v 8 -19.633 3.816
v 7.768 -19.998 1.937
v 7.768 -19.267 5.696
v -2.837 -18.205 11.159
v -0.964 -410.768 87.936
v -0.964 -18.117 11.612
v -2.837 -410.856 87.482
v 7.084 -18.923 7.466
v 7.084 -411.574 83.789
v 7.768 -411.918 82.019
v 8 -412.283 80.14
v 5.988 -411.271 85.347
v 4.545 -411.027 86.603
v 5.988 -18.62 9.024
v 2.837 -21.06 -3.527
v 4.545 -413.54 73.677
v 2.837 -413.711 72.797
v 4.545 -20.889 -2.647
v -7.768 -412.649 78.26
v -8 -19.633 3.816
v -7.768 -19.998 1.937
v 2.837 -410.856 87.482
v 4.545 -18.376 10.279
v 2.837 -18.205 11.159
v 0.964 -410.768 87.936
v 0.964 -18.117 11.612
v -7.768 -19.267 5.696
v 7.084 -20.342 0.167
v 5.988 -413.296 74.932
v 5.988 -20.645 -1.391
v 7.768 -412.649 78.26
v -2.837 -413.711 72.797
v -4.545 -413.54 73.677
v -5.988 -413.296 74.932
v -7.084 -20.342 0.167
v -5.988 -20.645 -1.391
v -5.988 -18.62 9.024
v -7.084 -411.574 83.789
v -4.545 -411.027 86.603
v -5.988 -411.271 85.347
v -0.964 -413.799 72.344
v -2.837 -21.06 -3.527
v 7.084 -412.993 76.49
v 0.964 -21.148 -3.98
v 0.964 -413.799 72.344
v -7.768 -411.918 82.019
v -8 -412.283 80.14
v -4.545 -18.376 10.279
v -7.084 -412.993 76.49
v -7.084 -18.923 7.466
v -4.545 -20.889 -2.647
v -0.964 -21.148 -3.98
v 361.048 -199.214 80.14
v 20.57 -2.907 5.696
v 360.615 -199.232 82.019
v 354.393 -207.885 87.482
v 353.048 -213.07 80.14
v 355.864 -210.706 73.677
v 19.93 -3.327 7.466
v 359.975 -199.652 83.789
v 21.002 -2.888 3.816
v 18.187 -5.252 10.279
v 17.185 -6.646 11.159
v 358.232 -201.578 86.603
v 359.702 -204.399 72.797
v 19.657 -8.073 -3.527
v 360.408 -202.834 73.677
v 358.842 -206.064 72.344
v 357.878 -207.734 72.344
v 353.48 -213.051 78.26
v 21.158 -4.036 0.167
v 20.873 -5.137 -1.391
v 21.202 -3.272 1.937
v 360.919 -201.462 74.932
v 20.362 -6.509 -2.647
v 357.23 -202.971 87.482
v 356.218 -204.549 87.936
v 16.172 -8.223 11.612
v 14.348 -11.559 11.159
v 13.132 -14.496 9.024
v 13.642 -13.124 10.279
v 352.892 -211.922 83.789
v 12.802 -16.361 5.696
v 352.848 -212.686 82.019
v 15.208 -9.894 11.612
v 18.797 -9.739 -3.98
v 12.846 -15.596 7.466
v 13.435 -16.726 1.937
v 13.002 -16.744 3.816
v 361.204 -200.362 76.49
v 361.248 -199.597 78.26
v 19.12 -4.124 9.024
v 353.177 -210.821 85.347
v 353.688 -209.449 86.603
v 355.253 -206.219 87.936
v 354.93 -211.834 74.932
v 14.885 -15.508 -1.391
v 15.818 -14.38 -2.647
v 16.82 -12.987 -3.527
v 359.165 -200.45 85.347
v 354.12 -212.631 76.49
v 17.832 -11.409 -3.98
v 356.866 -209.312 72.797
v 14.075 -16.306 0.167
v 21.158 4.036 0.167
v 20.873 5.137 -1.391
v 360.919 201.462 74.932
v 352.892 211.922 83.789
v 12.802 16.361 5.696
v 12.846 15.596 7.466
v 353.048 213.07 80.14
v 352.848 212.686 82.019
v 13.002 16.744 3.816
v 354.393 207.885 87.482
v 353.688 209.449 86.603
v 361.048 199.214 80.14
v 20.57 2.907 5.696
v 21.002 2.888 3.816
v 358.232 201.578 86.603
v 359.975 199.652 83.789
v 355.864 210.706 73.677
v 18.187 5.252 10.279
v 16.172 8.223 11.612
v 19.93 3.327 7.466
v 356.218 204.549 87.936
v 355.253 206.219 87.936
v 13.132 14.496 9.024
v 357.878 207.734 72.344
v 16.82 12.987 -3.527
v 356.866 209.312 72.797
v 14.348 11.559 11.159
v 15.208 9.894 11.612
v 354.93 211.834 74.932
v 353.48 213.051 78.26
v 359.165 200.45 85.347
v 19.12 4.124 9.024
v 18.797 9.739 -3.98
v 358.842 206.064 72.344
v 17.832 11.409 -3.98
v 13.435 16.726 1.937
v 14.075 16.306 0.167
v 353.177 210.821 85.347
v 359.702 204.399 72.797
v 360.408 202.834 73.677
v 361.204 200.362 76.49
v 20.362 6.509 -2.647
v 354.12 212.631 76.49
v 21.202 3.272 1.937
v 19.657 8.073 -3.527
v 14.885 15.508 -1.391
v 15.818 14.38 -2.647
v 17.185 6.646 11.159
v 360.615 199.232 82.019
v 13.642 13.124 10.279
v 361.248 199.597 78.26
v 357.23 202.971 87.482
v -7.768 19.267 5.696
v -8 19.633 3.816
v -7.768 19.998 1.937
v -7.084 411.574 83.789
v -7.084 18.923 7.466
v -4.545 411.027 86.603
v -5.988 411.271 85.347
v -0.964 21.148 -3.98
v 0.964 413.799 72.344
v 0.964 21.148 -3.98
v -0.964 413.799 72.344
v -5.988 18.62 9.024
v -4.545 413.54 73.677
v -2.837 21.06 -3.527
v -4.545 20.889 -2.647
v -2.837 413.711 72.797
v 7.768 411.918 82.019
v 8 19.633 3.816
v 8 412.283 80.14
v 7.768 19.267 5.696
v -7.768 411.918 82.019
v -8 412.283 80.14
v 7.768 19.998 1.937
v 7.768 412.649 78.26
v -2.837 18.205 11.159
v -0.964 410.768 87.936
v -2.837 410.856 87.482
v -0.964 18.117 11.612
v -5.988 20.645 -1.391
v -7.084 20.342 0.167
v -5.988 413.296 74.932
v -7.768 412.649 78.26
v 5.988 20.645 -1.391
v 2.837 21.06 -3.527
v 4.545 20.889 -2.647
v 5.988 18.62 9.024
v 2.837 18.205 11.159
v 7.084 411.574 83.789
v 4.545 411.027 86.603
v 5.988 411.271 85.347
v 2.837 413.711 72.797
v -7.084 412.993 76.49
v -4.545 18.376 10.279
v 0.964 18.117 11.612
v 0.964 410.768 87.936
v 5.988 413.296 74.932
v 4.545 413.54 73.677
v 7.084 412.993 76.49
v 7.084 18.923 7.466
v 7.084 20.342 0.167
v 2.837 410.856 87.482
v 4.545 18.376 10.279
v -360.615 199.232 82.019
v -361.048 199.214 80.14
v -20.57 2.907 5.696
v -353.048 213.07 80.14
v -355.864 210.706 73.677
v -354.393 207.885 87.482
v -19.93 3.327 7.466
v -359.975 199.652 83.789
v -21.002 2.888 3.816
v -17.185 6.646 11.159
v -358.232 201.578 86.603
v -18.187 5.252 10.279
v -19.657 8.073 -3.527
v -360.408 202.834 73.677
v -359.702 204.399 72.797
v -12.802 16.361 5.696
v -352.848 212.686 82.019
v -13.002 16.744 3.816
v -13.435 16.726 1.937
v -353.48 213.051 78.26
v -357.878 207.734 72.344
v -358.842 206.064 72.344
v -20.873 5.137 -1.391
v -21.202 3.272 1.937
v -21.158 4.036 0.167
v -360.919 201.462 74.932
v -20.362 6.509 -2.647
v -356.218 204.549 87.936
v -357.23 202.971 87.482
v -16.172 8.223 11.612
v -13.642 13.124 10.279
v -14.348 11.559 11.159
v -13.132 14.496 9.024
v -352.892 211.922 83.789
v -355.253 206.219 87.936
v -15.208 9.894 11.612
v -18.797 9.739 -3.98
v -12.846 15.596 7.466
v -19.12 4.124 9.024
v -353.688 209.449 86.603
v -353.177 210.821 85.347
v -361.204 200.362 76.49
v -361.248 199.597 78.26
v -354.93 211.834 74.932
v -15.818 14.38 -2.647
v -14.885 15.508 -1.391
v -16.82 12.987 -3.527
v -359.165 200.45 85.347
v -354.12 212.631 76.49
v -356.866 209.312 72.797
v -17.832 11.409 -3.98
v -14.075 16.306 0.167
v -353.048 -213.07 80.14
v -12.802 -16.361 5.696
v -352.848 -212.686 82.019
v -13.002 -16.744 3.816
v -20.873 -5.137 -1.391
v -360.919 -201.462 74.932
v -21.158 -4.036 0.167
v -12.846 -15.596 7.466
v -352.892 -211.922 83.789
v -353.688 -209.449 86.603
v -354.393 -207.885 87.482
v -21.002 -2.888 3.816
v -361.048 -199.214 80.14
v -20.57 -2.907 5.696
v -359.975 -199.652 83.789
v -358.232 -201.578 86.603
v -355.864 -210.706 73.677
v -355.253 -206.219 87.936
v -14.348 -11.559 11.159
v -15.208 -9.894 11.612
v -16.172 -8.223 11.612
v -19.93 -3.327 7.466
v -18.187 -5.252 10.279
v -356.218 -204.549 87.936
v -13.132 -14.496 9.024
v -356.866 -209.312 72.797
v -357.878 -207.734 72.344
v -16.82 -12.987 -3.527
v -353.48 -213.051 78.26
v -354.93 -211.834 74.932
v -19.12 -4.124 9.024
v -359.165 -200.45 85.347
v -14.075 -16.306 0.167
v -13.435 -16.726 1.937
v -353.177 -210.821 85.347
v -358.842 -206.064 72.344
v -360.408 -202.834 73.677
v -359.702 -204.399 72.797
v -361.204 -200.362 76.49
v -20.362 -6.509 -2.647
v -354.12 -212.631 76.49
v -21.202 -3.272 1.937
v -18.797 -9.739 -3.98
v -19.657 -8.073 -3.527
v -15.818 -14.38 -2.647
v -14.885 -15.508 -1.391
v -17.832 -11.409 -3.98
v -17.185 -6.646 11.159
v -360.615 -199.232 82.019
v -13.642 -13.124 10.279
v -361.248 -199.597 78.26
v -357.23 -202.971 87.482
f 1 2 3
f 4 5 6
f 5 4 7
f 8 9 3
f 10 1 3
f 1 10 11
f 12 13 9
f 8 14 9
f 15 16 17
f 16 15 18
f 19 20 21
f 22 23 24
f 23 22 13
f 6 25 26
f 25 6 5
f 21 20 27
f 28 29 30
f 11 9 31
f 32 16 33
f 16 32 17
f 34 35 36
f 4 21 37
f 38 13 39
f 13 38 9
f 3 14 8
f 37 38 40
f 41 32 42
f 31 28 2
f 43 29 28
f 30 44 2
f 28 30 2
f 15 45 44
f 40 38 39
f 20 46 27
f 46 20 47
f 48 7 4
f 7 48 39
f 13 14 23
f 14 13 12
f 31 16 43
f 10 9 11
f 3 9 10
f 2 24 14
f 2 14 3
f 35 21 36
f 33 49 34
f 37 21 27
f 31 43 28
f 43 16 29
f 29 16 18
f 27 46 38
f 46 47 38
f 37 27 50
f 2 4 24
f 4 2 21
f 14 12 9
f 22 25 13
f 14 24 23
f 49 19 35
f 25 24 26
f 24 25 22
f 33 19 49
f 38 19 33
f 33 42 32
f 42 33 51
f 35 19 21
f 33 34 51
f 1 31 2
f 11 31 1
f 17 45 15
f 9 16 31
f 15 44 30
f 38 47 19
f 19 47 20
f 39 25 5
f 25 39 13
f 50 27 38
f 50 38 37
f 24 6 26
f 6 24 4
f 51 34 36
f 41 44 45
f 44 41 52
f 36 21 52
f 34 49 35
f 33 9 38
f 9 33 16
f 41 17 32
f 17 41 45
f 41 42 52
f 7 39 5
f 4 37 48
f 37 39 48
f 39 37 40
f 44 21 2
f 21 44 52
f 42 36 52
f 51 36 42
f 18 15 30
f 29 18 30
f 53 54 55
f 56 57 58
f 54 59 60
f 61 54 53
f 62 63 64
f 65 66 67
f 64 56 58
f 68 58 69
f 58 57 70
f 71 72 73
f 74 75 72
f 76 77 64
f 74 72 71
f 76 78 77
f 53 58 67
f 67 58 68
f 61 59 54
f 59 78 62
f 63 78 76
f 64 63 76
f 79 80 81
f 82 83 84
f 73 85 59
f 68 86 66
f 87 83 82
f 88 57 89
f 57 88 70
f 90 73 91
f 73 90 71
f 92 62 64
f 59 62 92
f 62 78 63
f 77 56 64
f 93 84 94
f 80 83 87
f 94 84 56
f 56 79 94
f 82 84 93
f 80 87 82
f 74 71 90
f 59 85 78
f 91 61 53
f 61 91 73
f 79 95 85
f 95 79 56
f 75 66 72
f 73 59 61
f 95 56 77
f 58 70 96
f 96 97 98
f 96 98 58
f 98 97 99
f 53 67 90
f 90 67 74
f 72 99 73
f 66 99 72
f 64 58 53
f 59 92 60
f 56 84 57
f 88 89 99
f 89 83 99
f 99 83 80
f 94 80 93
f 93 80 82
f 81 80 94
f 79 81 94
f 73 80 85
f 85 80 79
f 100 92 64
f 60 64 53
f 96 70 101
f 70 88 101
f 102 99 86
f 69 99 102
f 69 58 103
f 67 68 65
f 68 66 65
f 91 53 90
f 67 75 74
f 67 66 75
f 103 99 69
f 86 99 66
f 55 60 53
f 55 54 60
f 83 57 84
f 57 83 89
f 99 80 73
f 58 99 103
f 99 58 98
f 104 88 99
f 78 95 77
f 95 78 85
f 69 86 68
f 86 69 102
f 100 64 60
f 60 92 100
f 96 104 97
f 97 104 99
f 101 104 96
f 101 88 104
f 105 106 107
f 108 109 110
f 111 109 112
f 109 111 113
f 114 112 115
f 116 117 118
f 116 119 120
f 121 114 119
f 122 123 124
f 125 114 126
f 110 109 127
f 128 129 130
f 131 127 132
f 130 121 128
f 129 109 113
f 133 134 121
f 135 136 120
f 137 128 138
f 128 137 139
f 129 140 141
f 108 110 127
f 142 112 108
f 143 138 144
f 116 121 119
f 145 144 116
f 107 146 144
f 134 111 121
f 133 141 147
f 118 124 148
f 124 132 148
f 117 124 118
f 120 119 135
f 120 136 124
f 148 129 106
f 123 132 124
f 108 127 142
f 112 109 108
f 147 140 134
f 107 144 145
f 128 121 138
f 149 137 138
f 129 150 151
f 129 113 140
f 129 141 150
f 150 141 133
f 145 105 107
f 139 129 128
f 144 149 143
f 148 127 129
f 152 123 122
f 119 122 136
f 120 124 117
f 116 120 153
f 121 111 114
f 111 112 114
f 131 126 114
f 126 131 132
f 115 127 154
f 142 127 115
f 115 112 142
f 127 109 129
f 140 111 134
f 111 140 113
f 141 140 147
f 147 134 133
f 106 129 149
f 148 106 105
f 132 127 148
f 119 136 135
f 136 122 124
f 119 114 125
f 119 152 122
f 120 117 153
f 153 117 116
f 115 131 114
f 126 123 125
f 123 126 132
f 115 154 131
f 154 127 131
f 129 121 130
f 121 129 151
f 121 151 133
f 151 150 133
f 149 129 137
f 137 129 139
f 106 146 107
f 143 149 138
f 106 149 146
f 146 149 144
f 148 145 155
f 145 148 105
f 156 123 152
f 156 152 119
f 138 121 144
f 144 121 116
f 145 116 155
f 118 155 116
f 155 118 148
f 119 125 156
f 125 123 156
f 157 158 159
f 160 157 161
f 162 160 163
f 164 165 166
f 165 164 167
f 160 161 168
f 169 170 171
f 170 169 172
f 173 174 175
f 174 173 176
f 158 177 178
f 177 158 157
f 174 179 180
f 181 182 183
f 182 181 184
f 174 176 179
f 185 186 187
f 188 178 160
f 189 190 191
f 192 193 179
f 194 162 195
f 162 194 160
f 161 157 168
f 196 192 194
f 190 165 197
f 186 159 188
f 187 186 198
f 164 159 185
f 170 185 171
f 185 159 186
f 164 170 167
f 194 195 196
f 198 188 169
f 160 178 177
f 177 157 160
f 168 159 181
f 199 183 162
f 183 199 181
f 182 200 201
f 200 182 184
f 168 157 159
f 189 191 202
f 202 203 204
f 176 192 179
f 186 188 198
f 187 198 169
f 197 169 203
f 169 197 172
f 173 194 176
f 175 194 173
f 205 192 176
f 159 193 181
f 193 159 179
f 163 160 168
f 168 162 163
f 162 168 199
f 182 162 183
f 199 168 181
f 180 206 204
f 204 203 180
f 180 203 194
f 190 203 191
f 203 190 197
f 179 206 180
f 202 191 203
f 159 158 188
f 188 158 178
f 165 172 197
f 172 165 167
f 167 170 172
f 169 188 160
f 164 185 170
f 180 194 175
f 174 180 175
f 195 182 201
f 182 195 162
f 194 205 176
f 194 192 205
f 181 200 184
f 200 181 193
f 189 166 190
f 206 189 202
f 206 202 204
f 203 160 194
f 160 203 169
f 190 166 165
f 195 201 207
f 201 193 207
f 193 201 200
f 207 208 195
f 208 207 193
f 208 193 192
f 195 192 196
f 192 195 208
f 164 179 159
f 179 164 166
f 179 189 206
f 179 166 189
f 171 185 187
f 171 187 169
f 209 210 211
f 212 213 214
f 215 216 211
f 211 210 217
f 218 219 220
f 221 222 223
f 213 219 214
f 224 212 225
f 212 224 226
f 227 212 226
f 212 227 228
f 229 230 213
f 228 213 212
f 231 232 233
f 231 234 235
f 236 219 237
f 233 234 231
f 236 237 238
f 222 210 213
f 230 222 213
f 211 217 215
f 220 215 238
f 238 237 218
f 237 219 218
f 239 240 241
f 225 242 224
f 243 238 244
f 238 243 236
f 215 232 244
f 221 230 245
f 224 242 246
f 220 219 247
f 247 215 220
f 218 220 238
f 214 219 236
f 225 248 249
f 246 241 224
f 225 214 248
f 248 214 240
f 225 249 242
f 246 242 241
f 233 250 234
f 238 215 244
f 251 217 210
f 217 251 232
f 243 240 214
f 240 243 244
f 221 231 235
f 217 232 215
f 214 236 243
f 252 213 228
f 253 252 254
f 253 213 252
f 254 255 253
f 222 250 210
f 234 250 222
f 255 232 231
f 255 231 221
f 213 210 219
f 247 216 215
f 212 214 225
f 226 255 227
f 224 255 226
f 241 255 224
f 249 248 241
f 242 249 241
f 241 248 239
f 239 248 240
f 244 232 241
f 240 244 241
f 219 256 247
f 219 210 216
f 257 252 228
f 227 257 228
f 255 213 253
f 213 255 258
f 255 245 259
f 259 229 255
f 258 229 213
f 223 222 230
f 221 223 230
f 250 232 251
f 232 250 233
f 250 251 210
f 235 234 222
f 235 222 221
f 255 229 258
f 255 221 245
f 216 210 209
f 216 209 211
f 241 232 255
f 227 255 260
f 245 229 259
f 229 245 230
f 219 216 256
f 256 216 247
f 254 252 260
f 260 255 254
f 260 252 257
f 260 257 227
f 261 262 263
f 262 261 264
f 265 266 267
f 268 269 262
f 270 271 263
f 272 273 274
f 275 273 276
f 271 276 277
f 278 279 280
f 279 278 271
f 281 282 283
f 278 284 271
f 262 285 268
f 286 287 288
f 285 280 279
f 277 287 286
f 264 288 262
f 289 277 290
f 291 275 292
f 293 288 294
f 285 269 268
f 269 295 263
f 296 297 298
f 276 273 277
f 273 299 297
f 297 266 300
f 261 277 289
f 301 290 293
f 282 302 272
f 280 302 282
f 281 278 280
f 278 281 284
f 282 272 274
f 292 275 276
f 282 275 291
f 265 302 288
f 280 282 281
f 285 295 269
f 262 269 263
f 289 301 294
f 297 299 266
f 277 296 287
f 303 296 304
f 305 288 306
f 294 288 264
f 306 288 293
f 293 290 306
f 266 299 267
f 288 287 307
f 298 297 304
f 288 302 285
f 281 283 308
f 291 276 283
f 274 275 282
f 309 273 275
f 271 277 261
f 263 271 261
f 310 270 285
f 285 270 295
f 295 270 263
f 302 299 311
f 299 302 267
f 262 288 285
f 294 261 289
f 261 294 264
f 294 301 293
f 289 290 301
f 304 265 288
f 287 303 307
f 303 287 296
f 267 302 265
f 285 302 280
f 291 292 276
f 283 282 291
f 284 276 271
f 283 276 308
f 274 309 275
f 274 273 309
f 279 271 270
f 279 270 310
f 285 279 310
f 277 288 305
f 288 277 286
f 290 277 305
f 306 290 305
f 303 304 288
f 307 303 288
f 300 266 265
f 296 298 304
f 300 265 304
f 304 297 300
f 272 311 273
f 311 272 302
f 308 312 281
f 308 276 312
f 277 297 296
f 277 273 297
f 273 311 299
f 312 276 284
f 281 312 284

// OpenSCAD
//sphere(r=50,$fn=6);

//wemos_d1_mini();

//cube([40,40,30], center=true);
crossy();

//translate([0,0,30]) center();
//ws_2812();
//arms();


module arms(){
    for(i=[0:6]){
        rotate([0,0,30 + i*60]) translate([70,0,5]) rotate([0,-11,0]) arm();
    }
}

module center(){
    translate([0,0,-10]) wemos_d1_mini();
    union(){
        translate([0,0,50*0.2+2]) scale([1,1,0.2]) sphere(r=50,$fn=6, center=true);
        cylinder(r=50,h=25,$fn=6, center=true);
    }
    rotate([90,0,0]) translate([0,-10,0]) battery_18650();
}

module arm(){
    translate([0,0,10]) ws_2812();
    difference(){
        cube([30,50,10], center=true);
    }
}


module wemos_d1_mini(){
    cube([34.2,25.6,2]);
}

module ws_2812(){
    color([0.9,0.9,0.9]) minkowski(){
        cube([8,8,1], center=true);
        cylinder(r=2,h=1);
        }
    translate([0,0,2]){
        difference(){
            color([1,1,1,0.5]) sphere(r=3);
            translate([0,0,-5]) cube([10,10,10], center=true);
        }
    }
}
module battery_18650(){
    cylinder(r =18.6/2, h=65, center=true);
}

module crossy(){
    for(i=[0:6]){
        rotate([90,0,0])  rotate([-11,i*60,0]) translate([0,0,220]){ 
            difference(){
                cylinder(r=16/2,h=400, center=true);
                //cylinder(r=(16/2 - 2),h=120,center=true);
            }
        }
    }
}
